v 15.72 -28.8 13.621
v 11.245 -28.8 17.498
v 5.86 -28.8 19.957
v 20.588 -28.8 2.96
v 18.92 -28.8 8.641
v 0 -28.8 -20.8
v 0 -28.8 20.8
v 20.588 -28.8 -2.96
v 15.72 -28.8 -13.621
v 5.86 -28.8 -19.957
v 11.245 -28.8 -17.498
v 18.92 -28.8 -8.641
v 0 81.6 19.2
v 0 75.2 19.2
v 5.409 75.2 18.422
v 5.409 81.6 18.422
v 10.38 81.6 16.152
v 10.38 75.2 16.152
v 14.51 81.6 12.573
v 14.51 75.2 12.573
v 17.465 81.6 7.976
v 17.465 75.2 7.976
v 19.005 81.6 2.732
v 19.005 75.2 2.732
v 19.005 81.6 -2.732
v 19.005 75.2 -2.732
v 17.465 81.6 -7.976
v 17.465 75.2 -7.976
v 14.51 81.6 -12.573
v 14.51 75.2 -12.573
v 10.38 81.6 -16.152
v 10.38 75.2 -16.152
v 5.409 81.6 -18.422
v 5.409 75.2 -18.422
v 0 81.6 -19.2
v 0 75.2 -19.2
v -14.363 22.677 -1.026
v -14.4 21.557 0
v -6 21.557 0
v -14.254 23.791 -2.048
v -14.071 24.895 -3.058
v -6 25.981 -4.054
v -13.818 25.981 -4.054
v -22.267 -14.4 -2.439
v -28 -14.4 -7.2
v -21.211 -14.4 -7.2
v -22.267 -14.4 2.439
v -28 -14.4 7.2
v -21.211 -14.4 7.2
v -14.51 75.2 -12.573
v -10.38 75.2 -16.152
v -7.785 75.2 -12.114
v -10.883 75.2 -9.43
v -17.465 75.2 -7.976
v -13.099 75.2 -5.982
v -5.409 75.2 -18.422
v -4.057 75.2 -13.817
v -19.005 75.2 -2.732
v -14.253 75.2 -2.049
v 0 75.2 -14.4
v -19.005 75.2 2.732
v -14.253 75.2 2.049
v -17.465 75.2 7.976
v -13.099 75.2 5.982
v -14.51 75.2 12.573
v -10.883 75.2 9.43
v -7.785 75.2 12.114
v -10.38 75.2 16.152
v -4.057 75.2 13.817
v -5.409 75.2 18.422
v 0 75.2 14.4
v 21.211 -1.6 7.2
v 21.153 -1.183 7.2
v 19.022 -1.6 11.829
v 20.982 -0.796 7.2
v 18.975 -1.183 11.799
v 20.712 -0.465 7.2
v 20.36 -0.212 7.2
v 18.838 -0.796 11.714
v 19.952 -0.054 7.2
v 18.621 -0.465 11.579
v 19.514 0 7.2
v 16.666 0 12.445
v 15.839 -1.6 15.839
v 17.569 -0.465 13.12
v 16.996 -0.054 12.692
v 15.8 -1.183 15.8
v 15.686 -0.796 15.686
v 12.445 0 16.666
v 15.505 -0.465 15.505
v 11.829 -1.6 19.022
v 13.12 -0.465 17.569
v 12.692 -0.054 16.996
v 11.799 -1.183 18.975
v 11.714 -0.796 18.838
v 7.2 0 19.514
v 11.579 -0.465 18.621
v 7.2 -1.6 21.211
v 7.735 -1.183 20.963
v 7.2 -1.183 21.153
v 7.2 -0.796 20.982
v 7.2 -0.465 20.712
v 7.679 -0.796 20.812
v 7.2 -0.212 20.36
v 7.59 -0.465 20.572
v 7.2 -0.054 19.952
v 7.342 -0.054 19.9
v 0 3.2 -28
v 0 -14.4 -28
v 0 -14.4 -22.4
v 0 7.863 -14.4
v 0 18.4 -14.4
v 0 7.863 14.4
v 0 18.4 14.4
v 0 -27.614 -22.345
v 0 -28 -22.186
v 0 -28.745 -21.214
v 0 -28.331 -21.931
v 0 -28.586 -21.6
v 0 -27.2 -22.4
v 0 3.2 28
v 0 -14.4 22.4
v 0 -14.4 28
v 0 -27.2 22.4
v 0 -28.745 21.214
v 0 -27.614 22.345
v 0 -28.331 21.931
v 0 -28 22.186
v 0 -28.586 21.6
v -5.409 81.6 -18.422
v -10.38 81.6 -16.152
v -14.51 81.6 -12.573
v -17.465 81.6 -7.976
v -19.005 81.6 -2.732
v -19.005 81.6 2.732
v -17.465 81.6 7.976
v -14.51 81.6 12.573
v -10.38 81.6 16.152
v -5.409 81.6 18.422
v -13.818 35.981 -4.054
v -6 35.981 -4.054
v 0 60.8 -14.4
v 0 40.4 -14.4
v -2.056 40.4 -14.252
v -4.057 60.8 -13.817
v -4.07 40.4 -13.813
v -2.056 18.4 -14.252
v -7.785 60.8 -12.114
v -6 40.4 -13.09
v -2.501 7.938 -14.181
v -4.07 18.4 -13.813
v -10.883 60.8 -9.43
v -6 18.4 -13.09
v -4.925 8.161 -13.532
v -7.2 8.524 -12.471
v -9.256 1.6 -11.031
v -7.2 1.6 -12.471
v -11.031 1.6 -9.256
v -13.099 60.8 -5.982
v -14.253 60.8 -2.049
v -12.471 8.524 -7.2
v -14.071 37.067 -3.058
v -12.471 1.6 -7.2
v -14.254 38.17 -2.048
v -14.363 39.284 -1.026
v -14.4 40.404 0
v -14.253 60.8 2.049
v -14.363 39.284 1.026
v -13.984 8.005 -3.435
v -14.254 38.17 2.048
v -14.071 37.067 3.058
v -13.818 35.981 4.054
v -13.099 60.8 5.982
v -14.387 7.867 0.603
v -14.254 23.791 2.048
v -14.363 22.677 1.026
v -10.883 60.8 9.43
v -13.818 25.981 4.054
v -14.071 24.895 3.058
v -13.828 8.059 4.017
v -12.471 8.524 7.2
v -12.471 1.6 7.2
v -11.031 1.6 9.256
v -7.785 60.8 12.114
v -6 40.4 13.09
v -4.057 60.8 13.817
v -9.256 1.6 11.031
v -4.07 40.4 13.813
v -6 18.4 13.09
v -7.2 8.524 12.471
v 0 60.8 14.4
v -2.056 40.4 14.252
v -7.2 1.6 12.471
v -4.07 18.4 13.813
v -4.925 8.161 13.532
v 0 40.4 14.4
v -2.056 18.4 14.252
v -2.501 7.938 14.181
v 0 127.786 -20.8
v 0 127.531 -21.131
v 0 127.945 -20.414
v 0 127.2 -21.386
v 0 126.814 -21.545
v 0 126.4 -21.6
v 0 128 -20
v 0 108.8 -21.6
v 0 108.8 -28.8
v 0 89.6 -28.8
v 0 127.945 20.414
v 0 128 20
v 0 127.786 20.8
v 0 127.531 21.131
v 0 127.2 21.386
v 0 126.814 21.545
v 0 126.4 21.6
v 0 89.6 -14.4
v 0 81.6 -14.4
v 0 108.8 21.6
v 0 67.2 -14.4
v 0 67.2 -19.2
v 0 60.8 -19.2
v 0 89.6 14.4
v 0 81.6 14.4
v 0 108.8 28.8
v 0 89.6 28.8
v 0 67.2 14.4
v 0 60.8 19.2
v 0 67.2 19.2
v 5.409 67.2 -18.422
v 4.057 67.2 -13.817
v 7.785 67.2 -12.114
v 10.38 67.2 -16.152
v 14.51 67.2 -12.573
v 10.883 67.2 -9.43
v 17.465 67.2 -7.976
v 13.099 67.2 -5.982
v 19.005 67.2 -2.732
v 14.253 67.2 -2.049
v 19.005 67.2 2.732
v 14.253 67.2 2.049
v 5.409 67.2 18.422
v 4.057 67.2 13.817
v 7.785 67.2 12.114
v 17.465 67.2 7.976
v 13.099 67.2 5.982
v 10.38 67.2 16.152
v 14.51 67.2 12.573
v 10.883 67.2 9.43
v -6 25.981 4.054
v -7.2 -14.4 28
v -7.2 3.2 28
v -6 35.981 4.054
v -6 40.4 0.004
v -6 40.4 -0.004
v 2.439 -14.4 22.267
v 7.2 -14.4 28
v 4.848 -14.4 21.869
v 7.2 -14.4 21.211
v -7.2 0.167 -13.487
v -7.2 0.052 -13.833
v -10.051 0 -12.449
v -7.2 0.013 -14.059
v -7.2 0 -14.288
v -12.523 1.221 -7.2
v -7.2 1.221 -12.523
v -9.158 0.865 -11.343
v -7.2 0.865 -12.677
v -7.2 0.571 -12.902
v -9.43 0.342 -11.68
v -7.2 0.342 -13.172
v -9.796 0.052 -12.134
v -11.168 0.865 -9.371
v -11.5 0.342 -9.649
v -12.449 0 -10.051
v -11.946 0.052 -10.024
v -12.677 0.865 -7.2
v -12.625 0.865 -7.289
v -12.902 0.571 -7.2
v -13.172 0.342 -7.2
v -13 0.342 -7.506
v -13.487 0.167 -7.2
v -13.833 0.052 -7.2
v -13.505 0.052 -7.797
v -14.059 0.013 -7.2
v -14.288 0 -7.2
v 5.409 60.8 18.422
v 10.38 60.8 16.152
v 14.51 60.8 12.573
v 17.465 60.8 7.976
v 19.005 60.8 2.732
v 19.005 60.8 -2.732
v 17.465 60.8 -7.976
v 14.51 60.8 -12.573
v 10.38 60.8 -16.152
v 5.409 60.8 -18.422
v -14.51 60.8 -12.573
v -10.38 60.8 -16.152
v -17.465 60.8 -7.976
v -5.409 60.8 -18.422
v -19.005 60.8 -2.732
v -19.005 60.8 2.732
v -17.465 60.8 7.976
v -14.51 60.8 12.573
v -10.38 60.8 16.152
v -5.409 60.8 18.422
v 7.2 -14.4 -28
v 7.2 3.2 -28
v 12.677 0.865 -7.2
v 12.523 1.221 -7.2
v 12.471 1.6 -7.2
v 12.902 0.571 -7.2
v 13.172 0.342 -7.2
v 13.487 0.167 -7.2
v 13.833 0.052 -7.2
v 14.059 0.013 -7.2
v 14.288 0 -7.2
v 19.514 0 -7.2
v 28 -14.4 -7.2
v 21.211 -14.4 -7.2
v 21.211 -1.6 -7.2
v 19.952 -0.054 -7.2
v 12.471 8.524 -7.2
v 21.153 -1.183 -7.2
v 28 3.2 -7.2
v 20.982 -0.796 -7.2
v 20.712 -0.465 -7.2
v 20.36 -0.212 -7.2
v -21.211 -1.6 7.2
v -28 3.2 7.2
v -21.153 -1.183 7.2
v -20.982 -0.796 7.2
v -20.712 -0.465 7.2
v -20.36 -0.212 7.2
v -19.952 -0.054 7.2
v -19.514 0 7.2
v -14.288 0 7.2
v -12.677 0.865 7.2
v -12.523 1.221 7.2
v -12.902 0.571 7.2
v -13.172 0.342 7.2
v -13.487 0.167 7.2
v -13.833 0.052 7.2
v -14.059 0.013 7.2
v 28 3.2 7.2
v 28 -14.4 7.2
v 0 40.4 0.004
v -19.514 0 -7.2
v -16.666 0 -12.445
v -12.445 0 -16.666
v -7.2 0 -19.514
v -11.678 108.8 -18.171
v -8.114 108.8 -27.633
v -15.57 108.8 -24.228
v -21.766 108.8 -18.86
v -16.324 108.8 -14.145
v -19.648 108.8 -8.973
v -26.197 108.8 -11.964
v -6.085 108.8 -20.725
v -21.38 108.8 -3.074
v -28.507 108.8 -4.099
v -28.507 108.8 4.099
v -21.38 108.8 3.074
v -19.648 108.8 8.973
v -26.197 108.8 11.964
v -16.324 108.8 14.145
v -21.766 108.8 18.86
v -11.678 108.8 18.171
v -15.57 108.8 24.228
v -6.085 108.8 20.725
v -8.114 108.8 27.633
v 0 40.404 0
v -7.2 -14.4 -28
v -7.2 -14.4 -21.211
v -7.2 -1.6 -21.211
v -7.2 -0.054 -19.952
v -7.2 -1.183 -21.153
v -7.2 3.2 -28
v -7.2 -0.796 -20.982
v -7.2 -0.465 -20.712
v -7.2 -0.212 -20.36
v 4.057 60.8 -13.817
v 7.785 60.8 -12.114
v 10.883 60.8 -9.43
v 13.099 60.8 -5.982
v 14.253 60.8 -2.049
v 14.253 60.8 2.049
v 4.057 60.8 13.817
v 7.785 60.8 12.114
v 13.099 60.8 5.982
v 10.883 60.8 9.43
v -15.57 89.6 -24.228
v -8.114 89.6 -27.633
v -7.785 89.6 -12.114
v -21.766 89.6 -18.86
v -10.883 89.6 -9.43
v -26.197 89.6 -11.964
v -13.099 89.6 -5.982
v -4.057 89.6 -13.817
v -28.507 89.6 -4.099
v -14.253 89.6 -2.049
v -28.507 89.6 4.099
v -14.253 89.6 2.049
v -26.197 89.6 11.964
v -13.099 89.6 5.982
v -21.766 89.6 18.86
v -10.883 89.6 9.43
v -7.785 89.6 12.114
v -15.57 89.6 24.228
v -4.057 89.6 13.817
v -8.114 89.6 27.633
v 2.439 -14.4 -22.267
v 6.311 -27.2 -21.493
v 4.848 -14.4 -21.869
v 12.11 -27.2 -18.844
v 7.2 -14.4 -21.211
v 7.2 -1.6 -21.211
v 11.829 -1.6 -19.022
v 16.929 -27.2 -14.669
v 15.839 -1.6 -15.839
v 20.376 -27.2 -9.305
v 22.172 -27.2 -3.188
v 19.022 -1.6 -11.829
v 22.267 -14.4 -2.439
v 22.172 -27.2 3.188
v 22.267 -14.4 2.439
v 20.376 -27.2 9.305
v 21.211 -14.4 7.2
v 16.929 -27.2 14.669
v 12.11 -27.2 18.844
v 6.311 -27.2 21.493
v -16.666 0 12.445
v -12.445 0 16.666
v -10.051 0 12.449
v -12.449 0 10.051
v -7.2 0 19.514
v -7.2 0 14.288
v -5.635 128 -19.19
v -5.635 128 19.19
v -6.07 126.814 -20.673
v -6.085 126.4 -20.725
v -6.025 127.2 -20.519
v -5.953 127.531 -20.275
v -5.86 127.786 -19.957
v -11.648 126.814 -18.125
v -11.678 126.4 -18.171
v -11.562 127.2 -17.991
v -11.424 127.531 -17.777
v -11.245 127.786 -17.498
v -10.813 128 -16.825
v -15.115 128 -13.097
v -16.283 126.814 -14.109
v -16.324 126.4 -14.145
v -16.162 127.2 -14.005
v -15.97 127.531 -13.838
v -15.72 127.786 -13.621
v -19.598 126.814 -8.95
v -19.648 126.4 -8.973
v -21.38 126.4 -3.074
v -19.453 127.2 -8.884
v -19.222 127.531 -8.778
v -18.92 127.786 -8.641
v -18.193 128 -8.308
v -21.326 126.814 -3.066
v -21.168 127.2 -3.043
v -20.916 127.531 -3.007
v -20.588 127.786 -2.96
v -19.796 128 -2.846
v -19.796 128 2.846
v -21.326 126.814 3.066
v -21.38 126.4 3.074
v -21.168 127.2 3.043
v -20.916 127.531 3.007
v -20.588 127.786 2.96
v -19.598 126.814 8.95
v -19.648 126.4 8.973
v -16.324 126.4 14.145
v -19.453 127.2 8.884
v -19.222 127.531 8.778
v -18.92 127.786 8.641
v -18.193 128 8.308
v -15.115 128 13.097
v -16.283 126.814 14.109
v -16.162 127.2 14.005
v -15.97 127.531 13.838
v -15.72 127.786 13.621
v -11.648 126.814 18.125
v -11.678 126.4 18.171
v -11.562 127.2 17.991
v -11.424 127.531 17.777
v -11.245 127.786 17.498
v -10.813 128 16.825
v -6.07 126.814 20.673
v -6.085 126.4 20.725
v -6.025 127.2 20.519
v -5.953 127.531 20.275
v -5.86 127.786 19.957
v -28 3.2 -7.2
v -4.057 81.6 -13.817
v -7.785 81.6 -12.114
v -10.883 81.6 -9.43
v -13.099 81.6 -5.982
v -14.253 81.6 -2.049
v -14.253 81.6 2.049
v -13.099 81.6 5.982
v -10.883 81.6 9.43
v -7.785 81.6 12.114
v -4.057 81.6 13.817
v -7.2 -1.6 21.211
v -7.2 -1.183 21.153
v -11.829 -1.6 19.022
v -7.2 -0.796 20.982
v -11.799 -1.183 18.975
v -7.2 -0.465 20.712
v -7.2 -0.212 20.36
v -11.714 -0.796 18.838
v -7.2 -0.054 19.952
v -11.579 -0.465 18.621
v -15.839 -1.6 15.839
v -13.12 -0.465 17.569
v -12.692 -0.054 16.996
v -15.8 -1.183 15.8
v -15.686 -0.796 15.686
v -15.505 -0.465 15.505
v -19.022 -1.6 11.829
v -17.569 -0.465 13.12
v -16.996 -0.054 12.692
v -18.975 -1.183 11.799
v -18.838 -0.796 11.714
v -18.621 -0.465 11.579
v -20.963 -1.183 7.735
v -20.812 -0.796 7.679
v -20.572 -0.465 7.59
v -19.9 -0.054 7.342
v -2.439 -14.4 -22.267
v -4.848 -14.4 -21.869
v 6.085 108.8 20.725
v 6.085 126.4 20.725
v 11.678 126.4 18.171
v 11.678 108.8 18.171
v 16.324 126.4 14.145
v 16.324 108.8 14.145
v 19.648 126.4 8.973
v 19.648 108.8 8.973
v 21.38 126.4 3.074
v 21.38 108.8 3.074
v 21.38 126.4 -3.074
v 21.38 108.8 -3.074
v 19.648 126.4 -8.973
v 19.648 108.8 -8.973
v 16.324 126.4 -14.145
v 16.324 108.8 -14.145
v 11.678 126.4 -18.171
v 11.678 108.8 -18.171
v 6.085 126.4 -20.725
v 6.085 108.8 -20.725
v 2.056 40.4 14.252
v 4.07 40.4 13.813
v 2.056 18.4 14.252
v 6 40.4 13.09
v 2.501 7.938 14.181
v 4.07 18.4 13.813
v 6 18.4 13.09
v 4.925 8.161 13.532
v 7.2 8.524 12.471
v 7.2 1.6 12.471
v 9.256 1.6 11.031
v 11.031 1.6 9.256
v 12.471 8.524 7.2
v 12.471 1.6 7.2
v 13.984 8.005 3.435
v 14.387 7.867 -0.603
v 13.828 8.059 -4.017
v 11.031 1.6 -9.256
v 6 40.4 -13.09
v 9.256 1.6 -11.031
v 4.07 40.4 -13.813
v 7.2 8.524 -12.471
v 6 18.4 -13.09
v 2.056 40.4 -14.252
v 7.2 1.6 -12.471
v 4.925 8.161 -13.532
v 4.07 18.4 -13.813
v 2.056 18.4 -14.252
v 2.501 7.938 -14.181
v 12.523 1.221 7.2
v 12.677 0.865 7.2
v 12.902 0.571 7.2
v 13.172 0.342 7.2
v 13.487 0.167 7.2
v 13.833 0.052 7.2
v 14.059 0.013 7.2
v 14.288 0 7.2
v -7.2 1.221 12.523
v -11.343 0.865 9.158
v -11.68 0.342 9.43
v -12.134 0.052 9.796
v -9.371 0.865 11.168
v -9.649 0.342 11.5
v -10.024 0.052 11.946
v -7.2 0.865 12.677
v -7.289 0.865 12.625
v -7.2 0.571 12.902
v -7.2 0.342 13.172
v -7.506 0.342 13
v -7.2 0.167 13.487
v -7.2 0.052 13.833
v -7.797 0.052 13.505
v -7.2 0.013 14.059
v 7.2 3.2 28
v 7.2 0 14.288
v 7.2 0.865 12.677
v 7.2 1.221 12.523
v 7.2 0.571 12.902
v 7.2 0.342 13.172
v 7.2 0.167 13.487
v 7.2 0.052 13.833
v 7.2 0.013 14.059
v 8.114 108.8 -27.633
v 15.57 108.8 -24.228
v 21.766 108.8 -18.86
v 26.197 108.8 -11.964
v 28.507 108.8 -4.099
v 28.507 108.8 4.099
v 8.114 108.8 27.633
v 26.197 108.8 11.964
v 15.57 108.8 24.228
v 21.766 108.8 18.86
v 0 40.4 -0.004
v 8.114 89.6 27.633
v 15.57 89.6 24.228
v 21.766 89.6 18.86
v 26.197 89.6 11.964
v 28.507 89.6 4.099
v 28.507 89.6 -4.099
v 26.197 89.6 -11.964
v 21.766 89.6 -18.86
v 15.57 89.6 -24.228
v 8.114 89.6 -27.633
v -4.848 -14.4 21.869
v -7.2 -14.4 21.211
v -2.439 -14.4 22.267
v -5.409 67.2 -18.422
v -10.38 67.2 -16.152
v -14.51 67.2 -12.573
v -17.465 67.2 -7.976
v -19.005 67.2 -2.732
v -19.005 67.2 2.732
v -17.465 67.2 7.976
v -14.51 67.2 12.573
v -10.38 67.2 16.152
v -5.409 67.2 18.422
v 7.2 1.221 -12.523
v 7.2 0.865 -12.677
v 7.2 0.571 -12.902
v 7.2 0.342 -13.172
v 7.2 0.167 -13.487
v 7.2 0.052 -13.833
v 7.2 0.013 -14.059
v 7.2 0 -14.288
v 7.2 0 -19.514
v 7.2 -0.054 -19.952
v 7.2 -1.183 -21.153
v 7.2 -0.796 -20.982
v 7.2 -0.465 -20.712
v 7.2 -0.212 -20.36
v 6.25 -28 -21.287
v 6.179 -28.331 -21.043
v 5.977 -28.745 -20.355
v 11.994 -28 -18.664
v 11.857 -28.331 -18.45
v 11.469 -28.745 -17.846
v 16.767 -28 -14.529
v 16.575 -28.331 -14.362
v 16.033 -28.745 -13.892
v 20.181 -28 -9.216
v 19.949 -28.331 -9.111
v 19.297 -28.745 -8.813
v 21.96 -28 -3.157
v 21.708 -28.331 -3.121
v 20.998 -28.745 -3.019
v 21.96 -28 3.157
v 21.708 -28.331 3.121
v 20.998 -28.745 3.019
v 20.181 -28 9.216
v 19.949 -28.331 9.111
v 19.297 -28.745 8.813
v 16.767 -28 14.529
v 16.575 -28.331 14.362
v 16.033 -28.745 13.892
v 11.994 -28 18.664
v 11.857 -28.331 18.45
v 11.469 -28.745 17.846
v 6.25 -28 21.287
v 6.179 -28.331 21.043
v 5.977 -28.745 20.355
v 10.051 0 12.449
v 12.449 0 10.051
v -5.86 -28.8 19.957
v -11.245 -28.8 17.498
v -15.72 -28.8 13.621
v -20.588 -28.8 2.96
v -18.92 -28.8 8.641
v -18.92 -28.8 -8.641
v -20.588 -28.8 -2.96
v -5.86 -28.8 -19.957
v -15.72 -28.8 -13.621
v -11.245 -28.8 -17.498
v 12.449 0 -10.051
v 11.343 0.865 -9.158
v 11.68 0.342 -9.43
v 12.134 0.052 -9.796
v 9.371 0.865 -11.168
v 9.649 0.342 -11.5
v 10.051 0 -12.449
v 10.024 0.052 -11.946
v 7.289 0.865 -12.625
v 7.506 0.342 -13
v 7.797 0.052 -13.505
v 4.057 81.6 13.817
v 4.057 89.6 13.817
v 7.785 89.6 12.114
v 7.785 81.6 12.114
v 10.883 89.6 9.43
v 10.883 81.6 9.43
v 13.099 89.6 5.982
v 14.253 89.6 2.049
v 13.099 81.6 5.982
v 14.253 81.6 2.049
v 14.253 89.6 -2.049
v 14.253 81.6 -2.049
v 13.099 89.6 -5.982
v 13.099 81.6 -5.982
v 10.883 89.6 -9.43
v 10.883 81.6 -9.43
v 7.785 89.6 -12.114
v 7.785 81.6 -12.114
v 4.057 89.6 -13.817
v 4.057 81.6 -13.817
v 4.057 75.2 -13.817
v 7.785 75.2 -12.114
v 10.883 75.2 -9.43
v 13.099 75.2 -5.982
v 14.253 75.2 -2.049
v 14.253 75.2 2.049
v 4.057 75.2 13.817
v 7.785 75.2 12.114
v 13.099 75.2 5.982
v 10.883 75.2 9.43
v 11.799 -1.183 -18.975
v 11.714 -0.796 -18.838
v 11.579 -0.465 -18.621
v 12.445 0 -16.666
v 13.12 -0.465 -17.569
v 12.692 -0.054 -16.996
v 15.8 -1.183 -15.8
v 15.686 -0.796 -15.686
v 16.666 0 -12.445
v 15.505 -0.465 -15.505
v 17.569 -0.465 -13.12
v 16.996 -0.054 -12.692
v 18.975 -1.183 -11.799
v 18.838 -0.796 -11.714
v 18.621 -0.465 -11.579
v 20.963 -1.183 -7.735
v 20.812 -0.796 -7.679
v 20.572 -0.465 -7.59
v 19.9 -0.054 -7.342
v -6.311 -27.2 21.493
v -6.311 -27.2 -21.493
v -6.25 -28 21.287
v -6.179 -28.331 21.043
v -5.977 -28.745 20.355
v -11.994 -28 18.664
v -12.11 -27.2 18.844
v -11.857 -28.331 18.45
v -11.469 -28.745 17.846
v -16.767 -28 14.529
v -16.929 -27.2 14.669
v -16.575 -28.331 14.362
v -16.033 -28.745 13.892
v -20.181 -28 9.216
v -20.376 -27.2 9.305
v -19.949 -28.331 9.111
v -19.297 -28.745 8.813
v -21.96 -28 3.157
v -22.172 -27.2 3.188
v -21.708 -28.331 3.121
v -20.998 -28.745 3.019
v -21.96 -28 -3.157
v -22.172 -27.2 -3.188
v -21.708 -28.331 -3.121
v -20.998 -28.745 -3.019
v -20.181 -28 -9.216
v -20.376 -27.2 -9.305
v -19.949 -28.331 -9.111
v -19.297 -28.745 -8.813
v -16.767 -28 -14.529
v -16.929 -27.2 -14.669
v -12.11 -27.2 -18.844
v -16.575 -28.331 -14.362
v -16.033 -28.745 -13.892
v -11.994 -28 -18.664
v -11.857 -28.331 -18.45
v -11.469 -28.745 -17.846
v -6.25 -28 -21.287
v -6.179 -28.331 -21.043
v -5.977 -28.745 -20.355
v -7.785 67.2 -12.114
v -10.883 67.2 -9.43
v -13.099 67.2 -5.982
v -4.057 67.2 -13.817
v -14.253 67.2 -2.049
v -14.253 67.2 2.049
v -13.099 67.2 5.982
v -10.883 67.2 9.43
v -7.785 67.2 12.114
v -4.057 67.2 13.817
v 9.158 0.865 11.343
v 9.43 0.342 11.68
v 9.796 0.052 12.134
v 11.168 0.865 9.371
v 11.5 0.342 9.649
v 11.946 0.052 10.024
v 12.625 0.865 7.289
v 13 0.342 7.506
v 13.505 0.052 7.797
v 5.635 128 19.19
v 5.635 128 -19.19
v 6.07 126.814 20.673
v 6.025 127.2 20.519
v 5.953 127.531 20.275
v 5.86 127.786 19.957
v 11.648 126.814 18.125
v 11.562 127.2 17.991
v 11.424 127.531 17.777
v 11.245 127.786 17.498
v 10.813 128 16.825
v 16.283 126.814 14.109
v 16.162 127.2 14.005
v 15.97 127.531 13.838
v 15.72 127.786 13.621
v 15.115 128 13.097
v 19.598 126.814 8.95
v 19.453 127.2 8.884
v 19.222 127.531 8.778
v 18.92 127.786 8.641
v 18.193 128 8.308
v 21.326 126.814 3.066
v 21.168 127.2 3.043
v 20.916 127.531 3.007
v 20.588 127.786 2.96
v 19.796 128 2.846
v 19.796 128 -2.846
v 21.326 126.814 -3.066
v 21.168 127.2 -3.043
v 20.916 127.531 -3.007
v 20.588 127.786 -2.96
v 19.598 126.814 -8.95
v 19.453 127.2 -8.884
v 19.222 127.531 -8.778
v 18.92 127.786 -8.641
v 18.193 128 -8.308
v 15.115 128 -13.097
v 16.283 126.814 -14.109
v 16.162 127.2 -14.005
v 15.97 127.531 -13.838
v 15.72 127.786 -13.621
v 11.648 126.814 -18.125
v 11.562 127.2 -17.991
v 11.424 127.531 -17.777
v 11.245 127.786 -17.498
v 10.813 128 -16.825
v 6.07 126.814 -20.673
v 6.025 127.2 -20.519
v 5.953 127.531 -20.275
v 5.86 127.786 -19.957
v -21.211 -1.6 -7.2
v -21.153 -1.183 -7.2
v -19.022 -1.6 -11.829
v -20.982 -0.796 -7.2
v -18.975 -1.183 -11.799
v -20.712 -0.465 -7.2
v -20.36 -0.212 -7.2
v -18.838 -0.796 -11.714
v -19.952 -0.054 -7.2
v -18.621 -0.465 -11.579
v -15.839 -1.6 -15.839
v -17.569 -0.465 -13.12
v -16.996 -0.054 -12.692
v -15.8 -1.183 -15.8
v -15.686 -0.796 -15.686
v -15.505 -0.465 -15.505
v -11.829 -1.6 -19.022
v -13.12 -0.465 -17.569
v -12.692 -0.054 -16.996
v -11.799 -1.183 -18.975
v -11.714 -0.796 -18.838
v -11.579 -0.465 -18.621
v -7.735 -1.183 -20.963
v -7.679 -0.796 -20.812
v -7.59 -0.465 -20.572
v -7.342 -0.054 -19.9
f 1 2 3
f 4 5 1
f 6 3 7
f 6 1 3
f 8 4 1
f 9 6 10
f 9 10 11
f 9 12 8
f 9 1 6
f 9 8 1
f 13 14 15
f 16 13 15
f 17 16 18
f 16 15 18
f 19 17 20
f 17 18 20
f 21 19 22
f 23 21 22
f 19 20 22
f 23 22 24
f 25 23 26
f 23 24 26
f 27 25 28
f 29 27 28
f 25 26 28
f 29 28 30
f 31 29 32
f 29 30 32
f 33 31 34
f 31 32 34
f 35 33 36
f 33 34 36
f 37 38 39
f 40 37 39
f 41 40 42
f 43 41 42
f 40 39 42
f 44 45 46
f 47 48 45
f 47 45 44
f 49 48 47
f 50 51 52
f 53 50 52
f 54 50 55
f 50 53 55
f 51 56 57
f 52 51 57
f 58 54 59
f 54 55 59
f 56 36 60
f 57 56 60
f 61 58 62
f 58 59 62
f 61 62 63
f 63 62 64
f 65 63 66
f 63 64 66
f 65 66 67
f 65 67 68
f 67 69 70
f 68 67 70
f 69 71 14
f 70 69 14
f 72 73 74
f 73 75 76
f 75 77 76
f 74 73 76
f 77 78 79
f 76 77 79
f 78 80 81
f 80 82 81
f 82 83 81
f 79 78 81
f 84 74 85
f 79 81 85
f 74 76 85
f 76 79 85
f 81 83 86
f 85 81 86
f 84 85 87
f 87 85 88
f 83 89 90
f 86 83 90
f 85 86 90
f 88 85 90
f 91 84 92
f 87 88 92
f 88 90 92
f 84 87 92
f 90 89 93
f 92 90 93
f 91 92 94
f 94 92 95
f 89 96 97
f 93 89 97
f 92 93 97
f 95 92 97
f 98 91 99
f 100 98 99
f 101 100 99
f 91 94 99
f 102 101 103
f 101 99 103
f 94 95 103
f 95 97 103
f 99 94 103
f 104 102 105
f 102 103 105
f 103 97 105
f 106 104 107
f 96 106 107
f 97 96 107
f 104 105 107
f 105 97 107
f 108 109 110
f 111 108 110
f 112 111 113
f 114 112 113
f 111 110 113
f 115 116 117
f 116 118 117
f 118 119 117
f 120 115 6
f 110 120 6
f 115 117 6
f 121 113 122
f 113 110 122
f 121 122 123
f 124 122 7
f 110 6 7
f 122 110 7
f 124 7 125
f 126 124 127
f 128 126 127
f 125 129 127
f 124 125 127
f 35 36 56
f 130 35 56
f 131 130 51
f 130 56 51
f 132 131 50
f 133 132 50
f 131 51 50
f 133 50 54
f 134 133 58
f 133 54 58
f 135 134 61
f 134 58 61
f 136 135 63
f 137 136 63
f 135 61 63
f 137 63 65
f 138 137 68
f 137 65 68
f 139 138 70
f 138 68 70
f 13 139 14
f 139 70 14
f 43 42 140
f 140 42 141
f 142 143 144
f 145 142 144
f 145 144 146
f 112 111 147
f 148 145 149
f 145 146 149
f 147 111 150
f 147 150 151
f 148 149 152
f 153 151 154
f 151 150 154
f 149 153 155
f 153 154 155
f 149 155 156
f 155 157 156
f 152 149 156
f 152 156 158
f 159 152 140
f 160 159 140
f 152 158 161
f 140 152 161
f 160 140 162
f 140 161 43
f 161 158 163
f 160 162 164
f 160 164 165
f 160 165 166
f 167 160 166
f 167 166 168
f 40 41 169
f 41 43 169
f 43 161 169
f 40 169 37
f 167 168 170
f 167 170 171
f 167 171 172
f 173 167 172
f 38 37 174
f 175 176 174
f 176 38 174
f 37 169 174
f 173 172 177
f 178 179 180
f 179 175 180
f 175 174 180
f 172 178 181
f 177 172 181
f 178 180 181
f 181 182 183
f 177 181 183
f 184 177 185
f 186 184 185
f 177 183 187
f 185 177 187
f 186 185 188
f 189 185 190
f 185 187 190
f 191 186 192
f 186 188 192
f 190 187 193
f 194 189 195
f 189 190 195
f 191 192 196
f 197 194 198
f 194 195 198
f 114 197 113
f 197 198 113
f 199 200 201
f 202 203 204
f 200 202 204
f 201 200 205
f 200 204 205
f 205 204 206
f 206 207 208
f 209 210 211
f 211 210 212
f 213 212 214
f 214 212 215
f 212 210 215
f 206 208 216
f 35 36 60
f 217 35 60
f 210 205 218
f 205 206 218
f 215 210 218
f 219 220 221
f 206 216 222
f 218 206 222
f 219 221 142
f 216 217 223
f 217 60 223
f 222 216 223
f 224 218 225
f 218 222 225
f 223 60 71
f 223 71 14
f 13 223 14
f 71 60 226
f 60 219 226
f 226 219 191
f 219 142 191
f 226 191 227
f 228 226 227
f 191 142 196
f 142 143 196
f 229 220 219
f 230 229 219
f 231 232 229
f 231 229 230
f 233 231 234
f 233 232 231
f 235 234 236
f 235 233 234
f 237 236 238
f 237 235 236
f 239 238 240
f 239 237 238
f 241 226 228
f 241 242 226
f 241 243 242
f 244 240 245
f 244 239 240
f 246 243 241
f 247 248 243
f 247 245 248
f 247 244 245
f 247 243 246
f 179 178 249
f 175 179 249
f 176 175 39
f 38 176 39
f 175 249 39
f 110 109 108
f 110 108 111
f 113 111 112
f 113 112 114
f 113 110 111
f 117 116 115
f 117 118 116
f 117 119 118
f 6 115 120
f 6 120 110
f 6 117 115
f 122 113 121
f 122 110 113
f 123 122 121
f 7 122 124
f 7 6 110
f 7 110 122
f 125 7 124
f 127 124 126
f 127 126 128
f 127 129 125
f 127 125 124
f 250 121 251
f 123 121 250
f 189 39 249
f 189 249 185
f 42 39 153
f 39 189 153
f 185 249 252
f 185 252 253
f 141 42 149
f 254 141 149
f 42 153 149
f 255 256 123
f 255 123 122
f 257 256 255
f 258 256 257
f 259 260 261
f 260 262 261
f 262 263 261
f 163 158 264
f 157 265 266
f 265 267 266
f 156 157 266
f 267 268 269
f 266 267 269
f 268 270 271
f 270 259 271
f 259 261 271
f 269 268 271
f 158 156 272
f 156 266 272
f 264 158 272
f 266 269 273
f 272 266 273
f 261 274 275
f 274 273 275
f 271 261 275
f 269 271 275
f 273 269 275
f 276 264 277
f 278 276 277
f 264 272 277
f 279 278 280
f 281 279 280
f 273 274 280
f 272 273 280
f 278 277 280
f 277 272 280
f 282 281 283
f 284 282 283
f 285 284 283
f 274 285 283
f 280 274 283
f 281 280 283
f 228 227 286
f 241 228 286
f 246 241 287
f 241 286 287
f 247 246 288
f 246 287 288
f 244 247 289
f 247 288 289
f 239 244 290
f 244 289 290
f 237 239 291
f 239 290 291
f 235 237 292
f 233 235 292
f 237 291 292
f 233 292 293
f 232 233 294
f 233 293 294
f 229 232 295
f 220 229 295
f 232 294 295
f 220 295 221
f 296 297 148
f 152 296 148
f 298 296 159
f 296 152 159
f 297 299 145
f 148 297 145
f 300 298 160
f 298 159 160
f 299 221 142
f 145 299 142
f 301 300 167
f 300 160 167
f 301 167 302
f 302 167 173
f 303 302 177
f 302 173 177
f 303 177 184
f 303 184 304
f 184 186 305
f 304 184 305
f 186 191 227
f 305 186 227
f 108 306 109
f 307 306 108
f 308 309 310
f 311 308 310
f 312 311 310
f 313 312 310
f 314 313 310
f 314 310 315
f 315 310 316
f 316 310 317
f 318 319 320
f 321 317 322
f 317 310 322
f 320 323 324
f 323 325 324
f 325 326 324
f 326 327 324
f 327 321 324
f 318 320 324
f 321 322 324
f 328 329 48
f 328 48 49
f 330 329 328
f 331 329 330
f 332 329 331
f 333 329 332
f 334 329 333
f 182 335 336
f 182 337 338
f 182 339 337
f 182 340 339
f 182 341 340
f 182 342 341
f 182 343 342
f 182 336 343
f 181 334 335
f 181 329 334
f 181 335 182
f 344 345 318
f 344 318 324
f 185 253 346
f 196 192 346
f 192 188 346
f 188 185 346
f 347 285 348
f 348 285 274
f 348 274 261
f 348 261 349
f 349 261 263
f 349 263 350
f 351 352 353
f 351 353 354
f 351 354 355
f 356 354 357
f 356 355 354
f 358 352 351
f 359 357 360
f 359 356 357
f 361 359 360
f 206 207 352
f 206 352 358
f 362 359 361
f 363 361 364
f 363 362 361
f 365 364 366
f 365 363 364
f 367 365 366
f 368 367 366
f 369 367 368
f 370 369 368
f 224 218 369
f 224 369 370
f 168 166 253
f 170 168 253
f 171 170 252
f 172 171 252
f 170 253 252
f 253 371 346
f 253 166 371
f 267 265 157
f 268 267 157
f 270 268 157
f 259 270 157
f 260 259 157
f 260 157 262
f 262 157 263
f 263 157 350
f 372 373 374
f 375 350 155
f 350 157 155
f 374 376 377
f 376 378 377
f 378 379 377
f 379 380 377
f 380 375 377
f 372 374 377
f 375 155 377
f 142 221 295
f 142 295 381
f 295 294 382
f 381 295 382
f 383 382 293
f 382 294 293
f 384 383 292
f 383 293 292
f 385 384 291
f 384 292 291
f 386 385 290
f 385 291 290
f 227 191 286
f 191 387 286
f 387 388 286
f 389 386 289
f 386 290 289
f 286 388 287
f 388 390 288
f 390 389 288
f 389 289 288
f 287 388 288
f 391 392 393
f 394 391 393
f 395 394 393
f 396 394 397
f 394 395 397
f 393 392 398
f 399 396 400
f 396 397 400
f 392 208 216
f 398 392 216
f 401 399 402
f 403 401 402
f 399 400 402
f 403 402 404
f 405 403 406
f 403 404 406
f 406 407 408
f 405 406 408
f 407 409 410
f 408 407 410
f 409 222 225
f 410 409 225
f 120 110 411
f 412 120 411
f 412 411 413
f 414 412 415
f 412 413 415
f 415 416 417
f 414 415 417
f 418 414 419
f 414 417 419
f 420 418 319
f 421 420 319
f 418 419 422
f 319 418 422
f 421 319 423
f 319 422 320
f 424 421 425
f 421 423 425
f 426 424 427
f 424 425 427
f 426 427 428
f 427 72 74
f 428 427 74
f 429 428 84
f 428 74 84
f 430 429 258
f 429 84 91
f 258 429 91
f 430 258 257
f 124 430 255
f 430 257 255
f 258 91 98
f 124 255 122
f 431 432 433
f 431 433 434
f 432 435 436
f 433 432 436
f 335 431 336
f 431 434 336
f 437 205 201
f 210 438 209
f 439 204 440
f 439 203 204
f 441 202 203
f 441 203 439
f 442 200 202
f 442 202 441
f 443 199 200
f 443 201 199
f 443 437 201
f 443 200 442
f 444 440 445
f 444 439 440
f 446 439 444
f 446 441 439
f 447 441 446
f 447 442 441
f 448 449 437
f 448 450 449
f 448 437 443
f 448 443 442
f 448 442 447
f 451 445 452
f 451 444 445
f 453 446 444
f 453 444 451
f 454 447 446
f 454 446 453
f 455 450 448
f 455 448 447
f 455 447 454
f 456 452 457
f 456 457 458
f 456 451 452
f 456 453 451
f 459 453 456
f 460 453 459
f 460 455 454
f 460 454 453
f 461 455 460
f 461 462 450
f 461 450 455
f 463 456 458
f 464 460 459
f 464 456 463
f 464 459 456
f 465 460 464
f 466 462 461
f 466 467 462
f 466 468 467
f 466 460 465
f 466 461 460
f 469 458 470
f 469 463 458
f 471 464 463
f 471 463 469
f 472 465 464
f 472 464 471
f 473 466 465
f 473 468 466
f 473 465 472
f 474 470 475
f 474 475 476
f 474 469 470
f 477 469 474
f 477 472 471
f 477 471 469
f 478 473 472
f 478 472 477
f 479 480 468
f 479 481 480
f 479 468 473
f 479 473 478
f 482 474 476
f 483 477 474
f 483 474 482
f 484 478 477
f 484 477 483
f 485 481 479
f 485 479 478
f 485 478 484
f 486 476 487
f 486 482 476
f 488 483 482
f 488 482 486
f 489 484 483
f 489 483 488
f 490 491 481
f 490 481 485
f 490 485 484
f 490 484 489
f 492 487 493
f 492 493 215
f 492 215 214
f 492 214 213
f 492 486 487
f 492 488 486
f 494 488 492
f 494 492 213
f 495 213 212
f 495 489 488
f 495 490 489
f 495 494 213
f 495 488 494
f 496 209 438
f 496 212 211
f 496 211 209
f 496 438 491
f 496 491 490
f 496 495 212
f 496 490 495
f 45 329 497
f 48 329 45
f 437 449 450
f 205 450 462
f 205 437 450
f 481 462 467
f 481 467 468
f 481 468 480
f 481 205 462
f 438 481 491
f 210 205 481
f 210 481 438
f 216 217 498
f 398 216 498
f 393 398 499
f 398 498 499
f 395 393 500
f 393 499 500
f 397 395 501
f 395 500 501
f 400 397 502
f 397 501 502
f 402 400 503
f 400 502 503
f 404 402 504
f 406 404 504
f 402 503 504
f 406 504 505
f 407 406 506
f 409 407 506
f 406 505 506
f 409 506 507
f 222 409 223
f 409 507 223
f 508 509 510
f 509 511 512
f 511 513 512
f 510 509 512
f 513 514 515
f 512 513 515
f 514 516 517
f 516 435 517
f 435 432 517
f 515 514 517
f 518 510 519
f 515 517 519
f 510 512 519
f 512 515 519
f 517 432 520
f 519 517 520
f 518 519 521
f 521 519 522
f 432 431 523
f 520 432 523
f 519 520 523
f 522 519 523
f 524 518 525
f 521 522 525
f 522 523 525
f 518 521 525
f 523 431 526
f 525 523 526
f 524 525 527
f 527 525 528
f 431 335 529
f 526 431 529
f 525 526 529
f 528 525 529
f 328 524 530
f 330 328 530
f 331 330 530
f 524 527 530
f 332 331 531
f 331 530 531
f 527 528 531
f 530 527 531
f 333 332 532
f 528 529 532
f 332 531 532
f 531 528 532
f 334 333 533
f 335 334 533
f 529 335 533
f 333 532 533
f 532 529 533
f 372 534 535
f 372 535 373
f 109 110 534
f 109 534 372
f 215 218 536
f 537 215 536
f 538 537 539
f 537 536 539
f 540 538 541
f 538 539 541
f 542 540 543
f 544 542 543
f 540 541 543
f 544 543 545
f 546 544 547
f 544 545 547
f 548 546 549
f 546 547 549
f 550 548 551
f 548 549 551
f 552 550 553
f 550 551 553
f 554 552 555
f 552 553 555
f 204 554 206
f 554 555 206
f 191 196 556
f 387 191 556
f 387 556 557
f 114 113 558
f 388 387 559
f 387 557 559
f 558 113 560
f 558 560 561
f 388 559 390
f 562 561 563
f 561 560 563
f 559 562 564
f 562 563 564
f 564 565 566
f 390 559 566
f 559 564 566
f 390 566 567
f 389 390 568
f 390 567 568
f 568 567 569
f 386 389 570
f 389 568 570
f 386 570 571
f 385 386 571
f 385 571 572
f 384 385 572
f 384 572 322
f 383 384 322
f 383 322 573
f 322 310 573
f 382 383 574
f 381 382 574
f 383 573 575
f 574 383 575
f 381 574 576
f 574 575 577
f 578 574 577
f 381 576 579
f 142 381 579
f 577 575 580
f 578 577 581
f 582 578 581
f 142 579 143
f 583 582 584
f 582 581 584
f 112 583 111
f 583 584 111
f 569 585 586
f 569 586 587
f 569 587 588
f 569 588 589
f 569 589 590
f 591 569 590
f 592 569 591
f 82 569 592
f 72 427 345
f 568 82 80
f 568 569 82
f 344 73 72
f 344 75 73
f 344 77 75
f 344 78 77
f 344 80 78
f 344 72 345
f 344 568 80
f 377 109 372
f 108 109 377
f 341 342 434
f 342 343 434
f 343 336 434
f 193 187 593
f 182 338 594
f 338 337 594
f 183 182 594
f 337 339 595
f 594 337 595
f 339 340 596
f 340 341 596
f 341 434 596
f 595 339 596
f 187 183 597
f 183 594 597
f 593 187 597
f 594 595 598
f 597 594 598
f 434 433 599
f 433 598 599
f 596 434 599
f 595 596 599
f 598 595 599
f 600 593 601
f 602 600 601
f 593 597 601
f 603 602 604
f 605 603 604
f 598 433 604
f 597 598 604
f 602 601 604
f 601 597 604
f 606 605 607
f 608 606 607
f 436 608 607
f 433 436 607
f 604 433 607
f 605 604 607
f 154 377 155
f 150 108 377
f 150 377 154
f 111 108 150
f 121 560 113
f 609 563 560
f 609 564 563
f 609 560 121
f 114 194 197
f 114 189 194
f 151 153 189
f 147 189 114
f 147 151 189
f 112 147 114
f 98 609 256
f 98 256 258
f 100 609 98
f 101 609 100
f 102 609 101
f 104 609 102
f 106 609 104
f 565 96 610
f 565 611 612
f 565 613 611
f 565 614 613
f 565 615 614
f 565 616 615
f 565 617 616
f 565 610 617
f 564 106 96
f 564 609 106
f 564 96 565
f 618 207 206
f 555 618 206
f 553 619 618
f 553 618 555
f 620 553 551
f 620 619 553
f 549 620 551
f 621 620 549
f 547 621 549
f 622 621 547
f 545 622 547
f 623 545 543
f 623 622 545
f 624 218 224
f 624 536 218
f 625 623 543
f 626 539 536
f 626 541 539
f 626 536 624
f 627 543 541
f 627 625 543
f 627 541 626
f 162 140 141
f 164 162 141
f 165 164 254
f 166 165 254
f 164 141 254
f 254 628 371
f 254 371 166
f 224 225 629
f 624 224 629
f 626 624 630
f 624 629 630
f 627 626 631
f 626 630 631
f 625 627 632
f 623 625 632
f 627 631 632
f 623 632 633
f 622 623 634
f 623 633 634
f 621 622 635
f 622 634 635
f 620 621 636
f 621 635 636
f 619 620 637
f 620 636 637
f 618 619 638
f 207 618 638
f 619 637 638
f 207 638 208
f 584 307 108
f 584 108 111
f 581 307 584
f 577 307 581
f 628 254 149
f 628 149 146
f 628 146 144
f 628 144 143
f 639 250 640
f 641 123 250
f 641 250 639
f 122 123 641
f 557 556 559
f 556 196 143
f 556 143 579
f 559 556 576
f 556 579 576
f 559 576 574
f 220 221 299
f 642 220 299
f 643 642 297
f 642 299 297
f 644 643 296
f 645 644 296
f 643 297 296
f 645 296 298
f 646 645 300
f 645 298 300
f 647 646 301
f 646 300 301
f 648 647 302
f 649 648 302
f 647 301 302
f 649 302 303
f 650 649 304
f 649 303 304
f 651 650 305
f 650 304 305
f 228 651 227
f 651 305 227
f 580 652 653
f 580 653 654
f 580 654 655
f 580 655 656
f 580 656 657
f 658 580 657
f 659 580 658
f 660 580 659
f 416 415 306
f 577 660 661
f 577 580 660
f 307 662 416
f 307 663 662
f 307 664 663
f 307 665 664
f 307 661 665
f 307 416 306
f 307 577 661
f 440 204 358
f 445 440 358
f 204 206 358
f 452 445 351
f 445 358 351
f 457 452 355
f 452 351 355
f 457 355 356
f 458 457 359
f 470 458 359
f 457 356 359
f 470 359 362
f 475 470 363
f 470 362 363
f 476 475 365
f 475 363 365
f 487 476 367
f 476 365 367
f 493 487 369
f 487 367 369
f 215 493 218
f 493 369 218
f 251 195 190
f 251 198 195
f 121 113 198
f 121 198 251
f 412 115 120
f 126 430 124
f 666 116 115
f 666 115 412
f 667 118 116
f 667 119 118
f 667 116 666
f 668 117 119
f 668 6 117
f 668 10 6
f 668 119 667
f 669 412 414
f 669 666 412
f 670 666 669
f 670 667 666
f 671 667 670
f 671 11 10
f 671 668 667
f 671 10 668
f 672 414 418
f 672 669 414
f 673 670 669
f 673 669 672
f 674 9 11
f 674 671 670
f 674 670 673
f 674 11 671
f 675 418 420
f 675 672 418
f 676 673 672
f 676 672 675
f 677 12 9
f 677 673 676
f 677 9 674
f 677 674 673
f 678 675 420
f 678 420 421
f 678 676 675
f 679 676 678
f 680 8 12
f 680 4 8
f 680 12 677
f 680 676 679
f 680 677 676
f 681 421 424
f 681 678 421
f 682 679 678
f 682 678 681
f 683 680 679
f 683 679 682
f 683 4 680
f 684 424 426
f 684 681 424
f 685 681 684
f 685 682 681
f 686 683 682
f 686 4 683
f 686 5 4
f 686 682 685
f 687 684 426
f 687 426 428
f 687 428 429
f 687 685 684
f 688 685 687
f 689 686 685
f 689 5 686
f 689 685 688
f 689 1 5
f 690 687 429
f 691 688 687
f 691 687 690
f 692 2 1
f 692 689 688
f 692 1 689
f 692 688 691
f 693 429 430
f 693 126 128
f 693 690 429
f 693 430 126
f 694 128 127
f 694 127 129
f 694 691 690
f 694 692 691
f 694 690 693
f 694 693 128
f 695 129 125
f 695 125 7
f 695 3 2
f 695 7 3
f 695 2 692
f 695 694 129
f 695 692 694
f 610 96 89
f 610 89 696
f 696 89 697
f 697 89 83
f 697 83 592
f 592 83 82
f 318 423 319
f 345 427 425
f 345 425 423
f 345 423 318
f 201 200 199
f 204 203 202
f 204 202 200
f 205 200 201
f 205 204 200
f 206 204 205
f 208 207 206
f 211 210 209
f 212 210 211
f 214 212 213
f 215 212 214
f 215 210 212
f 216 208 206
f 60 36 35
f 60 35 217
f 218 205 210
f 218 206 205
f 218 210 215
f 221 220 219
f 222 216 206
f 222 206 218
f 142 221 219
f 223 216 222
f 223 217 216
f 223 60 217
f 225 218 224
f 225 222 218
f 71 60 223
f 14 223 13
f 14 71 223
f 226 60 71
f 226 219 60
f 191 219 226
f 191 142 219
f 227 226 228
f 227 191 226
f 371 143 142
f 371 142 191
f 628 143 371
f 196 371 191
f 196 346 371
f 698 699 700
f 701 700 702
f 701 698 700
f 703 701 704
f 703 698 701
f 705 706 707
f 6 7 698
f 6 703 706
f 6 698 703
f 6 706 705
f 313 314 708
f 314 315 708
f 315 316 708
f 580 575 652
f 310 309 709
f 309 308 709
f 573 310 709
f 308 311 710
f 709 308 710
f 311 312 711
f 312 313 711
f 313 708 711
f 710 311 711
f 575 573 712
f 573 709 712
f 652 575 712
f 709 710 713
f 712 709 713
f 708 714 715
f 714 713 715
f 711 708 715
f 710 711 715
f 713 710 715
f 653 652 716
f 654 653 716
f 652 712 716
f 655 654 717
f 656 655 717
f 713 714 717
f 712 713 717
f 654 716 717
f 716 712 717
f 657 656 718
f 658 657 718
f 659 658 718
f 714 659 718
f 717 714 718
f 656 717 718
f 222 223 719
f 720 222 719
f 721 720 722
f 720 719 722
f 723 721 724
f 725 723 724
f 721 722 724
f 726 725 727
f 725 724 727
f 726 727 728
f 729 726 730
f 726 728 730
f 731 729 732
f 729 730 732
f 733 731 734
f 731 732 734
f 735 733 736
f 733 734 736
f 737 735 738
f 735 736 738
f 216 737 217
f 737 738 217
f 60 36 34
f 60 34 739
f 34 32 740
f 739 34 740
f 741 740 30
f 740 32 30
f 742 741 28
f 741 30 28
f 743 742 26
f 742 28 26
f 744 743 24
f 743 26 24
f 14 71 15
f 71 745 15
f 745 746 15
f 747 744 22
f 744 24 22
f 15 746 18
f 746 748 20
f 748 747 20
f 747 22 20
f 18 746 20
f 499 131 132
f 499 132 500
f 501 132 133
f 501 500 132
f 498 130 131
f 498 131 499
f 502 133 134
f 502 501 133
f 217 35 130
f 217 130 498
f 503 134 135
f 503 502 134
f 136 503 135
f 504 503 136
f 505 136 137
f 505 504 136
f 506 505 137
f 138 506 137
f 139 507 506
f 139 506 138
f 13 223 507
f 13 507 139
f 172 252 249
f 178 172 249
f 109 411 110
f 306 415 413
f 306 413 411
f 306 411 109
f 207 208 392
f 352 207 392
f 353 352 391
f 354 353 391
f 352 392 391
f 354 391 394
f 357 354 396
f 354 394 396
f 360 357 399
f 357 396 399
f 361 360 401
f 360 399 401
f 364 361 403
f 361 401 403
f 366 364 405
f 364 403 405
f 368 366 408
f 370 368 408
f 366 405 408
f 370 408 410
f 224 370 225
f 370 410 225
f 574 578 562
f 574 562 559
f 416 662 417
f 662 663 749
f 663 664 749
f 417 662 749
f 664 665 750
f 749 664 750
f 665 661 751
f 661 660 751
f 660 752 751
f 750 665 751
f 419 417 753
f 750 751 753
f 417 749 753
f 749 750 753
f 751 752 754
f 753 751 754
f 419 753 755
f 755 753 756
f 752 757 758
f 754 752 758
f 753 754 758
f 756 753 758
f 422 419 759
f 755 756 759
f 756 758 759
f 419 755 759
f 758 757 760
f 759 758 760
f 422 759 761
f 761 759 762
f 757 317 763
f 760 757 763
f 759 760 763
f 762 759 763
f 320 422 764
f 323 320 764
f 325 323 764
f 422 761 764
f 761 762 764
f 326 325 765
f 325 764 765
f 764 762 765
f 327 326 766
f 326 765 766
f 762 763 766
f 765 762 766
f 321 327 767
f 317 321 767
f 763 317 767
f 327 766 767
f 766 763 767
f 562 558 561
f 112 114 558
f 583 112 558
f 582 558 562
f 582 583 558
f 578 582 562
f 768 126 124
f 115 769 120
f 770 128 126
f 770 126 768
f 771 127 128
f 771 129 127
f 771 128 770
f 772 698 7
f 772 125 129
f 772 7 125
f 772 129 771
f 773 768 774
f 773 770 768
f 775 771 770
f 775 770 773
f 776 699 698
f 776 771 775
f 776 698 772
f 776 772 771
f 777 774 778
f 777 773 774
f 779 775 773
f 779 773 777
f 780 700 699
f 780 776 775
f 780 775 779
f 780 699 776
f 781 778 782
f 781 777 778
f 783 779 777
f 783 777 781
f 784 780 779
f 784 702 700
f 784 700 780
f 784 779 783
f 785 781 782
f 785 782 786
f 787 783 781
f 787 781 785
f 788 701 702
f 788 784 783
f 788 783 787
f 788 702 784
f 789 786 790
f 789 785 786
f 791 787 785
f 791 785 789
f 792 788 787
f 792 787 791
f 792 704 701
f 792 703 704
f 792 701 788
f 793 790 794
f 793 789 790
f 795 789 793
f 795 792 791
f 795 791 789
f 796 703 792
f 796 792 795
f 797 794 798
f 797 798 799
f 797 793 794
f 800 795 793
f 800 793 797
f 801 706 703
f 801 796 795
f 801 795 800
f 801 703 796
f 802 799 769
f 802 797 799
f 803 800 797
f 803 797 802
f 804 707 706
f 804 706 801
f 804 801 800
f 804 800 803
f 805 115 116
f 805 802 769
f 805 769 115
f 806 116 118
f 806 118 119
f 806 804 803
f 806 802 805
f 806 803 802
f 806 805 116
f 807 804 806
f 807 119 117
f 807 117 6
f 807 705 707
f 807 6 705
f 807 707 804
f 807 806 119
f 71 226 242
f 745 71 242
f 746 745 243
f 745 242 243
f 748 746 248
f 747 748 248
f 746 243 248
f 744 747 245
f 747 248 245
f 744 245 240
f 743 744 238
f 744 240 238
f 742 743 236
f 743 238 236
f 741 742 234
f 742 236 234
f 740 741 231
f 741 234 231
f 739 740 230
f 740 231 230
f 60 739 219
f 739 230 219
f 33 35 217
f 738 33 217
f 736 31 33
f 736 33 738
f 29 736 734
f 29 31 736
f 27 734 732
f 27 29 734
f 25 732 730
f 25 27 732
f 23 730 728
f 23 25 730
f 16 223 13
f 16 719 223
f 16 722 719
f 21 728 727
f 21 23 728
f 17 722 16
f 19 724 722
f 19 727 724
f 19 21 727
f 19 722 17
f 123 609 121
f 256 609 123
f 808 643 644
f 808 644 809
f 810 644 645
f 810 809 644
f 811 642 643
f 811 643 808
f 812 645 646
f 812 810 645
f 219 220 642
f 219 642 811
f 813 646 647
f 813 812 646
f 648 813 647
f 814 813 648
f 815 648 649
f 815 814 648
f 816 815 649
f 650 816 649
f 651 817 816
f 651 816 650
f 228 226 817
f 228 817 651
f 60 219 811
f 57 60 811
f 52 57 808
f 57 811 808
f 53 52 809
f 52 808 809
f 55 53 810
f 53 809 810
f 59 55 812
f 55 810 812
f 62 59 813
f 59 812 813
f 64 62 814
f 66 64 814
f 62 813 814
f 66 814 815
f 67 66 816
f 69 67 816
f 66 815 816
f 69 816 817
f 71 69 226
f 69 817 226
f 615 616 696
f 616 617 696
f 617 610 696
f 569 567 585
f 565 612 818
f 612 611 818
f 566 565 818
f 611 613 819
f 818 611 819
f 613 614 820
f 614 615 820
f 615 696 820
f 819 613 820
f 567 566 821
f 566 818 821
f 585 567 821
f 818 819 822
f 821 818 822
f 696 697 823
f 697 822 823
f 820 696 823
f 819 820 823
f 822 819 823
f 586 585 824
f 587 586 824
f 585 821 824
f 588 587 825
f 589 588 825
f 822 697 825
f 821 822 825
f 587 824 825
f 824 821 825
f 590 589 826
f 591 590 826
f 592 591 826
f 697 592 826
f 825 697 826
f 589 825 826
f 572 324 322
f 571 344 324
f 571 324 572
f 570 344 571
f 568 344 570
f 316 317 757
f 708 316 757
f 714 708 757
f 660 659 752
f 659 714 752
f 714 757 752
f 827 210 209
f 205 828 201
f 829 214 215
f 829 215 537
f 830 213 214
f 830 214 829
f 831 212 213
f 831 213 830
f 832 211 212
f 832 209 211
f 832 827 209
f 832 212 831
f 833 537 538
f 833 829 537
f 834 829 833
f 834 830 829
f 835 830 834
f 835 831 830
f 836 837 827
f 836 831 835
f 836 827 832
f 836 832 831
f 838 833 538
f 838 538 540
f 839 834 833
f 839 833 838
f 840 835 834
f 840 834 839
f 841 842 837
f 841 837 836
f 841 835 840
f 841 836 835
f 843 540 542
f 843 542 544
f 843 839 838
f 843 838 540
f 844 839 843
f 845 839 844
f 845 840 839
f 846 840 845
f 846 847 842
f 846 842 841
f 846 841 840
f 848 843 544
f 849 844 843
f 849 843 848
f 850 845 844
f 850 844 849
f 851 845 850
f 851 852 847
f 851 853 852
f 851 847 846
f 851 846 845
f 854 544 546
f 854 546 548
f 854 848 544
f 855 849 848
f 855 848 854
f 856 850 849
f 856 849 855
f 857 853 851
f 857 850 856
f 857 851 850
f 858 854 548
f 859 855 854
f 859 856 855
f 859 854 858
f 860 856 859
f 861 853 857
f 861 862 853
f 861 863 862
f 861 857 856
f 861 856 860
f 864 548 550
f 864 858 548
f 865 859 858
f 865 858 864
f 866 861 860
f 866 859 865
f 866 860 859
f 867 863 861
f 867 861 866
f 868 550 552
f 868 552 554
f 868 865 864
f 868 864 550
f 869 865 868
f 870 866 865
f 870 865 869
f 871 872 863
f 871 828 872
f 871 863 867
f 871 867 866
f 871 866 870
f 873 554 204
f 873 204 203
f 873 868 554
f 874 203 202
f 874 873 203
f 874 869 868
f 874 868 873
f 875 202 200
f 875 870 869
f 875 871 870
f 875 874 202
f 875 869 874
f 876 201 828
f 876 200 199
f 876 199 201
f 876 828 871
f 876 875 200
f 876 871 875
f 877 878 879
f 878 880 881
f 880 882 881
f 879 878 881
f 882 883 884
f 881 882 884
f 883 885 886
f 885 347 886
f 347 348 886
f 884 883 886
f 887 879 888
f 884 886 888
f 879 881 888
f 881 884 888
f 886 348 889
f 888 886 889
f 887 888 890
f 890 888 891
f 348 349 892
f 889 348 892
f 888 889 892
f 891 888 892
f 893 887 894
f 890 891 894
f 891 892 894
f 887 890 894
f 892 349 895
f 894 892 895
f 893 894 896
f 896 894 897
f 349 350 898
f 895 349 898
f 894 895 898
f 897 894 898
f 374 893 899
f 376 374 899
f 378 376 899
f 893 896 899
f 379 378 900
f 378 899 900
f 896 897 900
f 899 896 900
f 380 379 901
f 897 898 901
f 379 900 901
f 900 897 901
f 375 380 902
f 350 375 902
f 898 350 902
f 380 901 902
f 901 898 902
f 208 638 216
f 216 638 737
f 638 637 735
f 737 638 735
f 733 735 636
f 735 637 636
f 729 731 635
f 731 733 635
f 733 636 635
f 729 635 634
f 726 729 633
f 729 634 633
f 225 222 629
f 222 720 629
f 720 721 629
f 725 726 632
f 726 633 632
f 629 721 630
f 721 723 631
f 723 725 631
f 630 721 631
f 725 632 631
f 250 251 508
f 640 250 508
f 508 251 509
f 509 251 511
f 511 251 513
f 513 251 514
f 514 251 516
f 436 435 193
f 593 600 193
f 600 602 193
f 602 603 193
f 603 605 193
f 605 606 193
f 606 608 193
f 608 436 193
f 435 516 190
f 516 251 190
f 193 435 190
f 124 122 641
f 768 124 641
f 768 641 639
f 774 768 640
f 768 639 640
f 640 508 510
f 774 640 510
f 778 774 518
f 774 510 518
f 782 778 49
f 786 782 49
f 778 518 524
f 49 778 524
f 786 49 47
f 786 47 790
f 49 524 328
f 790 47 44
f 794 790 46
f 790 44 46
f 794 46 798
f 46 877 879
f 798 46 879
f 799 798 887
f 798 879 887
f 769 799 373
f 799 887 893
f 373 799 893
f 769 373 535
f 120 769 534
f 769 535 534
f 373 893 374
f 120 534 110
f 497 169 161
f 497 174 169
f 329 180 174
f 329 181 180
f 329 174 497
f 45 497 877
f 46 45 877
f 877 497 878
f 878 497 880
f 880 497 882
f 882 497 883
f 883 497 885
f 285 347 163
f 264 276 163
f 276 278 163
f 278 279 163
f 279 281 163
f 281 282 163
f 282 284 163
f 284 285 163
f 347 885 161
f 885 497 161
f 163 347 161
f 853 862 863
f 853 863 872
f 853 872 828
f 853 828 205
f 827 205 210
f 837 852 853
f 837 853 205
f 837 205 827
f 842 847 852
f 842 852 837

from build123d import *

# Parameters (mm, degrees)
SKETCH1_R               = 4.5
BOSS_EXTRUDE1_DEPTH     = 19
SKETCH2_R               = 7
BOSS_EXTRUDE2_DEPTH     = 9
SKETCH3_R               = 6
BOSS_EXTRUDE3_DEPTH     = 2
SKETCH4_R               = 4.5
BOSS_EXTRUDE4_DEPTH     = 2.5
SKETCH5_R               = 6
BOSS_EXTRUDE5_DEPTH     = 2
SKETCH6_R               = 4.5
BOSS_EXTRUDE6_DEPTH     = 2.5
SKETCH7_R               = 9
BOSS_EXTRUDE7_DEPTH     = 6
SKETCH8_R               = 6.75
BOSS_EXTRUDE8_DEPTH     = 6
BOSS_EXTRUDE9_DEPTH     = 2.25
CIRPATTERN1_COUNT       = 2
CIRPATTERN1_ANGLE       = 90
FILLET1_R               = 0.5
FILLET3_R               = 0.5
SCALE3_SCALE            = 3.2
CUT_EXTRUDE1_DEPTH      = 135.323787916
CUT_EXTRUDE1_DEPTH_BACK = 135.323787916
SKETCH14_W              = 12
SKETCH14_H              = 22
CUT_EXTRUDE3_DEPTH      = 135.323787916


with BuildPart() as part:
    # Sketch1 → Boss-Extrude1 (new body)
    with BuildSketch(Plane(origin=(0, 0, 0), x_dir=(1, 0, 0), z_dir=(0, 1, 0))):
        Circle(SKETCH1_R)
    extrude(amount=BOSS_EXTRUDE1_DEPTH)

    # Sketch2 → Boss-Extrude2 (add)
    with BuildSketch(Plane.XZ):
        Circle(SKETCH2_R)
    extrude(amount=BOSS_EXTRUDE2_DEPTH)

    # Sketch3 → Boss-Extrude3 (add)
    with BuildSketch(Plane(origin=(0, 19, 0), x_dir=(1, 0, 0), z_dir=(0, 1, 0))):
        Circle(SKETCH3_R)
    extrude(amount=BOSS_EXTRUDE3_DEPTH)

    # Sketch4 → Boss-Extrude4 (add)
    with BuildSketch(Plane(origin=(0, 21, 0), x_dir=(1, 0, 0), z_dir=(0, 1, 0))):
        Circle(SKETCH4_R)
    extrude(amount=BOSS_EXTRUDE4_DEPTH)

    # Sketch5 → Boss-Extrude5 (add)
    with BuildSketch(Plane(origin=(0, 23.5, 0), x_dir=(1, 0, 0), z_dir=(0, 1, 0))):
        Circle(SKETCH5_R)
    extrude(amount=BOSS_EXTRUDE5_DEPTH)

    # Sketch6 → Boss-Extrude6 (add)
    with BuildSketch(Plane(origin=(0, 25.5, 0), x_dir=(1, 0, 0), z_dir=(0, 1, 0))):
        Circle(SKETCH6_R)
    extrude(amount=BOSS_EXTRUDE6_DEPTH)

    # Sketch7 → Boss-Extrude7 (add)
    with BuildSketch(Plane(origin=(0, 28, 0), x_dir=(1, 0, 0), z_dir=(0, 1, 0))):
        Circle(SKETCH7_R)
    extrude(amount=BOSS_EXTRUDE7_DEPTH)

    # Sketch8 → Boss-Extrude8 (add)
    with BuildSketch(Plane(origin=(0, 34, 0), x_dir=(1, 0, 0), z_dir=(0, 1, 0))):
        Circle(SKETCH8_R)
    extrude(amount=BOSS_EXTRUDE8_DEPTH)

    # Sketch10 → Boss-Extrude9 (add, symmetric)
    with BuildSketch(Plane(origin=(0, 0, 0), x_dir=(0, 0, -1), z_dir=(1, 0, 0))):
        Polygon((-8.75, -4.5), (8.75, -4.5), (8.75, 1), (0, 4), (-8.75, 1), align=None)
    boss_extrude9 = extrude(amount=BOSS_EXTRUDE9_DEPTH, both=True)

    # CirPattern1: Boss-Extrude9 ×2 about axis
    cirpattern1_axis = Axis((0, 19, 0), (0, -1, 0))
    for i in range(1, CIRPATTERN1_COUNT):
        add(boss_extrude9.rotate(cirpattern1_axis, i * CIRPATTERN1_ANGLE / (CIRPATTERN1_COUNT - 1)))

    # Fillet1
    fillet1_edges = [part.edges().sort_by_distance(p)[0] for p in [
        (4.949747468, 0, -4.949747468),
        (-4.949747468, 0, -4.949747468),
        (-4.949747468, 0, 4.949747468),
        (-7, -9, 0),
        (4.949747468, 0, 4.949747468),
        (-3.181980515, 0, -3.181980515),
        (3.181980515, 0, -3.181980515),
        (3.181980515, 0, 3.181980515),
        (-3.181980515, 0, 3.181980515),
    ]]
    fillet(fillet1_edges, radius=FILLET1_R)

    # Fillet3
    fillet3_edges = [part.edges().sort_by_distance(p)[0] for p in [
        (-6.75, 40, 0),
    ]]
    fillet(fillet3_edges, radius=FILLET3_R)


with BuildPart() as part_1:
    # Scale3: scaled about (0, 0, 0)
    add(part.part.scale(SCALE3_SCALE))

    # Sketch14 → Cut-Extrude1 (cut, two sides: drawn at the far end of the back side and taken through both)
    with BuildSketch(Plane.XY.offset(-CUT_EXTRUDE1_DEPTH_BACK)):
        with Locations((0, 29.4)):
            Rectangle(SKETCH14_W, SKETCH14_H)
    extrude(amount=CUT_EXTRUDE1_DEPTH + CUT_EXTRUDE1_DEPTH_BACK, mode=Mode.SUBTRACT)

    # Sketch17 → Cut-Extrude3 (cut, through all)
    with BuildSketch(Plane(origin=(0, 0, 0), x_dir=(0, 0, -1), z_dir=(1, 0, 0))):
        Polygon((0, 40.404265283), (-4.053541246, 35.980601263), (-4.053541246, 25.980601263), (0, 21.556937242), (4.053541246, 25.980601263), (4.053541246, 35.980601263), align=None)
    extrude(amount=-CUT_EXTRUDE3_DEPTH, mode=Mode.SUBTRACT)


with BuildPart() as body_2:
    # Split1: the piece on the far side of the plane
    add(part_1.part)
    split(bisect_by=Plane(origin=(0, 0, 0), x_dir=(0, 0, 1), z_dir=(1, 0, 0)), keep=Keep.BOTTOM)


with BuildPart() as part_2:
    add(part_1.part)

    # Split1
    split(bisect_by=Plane(origin=(0, 0, 0), x_dir=(0, 0, 1), z_dir=(1, 0, 0)), keep=Keep.TOP)


solid = Compound([body_2.part, part_2.part])
